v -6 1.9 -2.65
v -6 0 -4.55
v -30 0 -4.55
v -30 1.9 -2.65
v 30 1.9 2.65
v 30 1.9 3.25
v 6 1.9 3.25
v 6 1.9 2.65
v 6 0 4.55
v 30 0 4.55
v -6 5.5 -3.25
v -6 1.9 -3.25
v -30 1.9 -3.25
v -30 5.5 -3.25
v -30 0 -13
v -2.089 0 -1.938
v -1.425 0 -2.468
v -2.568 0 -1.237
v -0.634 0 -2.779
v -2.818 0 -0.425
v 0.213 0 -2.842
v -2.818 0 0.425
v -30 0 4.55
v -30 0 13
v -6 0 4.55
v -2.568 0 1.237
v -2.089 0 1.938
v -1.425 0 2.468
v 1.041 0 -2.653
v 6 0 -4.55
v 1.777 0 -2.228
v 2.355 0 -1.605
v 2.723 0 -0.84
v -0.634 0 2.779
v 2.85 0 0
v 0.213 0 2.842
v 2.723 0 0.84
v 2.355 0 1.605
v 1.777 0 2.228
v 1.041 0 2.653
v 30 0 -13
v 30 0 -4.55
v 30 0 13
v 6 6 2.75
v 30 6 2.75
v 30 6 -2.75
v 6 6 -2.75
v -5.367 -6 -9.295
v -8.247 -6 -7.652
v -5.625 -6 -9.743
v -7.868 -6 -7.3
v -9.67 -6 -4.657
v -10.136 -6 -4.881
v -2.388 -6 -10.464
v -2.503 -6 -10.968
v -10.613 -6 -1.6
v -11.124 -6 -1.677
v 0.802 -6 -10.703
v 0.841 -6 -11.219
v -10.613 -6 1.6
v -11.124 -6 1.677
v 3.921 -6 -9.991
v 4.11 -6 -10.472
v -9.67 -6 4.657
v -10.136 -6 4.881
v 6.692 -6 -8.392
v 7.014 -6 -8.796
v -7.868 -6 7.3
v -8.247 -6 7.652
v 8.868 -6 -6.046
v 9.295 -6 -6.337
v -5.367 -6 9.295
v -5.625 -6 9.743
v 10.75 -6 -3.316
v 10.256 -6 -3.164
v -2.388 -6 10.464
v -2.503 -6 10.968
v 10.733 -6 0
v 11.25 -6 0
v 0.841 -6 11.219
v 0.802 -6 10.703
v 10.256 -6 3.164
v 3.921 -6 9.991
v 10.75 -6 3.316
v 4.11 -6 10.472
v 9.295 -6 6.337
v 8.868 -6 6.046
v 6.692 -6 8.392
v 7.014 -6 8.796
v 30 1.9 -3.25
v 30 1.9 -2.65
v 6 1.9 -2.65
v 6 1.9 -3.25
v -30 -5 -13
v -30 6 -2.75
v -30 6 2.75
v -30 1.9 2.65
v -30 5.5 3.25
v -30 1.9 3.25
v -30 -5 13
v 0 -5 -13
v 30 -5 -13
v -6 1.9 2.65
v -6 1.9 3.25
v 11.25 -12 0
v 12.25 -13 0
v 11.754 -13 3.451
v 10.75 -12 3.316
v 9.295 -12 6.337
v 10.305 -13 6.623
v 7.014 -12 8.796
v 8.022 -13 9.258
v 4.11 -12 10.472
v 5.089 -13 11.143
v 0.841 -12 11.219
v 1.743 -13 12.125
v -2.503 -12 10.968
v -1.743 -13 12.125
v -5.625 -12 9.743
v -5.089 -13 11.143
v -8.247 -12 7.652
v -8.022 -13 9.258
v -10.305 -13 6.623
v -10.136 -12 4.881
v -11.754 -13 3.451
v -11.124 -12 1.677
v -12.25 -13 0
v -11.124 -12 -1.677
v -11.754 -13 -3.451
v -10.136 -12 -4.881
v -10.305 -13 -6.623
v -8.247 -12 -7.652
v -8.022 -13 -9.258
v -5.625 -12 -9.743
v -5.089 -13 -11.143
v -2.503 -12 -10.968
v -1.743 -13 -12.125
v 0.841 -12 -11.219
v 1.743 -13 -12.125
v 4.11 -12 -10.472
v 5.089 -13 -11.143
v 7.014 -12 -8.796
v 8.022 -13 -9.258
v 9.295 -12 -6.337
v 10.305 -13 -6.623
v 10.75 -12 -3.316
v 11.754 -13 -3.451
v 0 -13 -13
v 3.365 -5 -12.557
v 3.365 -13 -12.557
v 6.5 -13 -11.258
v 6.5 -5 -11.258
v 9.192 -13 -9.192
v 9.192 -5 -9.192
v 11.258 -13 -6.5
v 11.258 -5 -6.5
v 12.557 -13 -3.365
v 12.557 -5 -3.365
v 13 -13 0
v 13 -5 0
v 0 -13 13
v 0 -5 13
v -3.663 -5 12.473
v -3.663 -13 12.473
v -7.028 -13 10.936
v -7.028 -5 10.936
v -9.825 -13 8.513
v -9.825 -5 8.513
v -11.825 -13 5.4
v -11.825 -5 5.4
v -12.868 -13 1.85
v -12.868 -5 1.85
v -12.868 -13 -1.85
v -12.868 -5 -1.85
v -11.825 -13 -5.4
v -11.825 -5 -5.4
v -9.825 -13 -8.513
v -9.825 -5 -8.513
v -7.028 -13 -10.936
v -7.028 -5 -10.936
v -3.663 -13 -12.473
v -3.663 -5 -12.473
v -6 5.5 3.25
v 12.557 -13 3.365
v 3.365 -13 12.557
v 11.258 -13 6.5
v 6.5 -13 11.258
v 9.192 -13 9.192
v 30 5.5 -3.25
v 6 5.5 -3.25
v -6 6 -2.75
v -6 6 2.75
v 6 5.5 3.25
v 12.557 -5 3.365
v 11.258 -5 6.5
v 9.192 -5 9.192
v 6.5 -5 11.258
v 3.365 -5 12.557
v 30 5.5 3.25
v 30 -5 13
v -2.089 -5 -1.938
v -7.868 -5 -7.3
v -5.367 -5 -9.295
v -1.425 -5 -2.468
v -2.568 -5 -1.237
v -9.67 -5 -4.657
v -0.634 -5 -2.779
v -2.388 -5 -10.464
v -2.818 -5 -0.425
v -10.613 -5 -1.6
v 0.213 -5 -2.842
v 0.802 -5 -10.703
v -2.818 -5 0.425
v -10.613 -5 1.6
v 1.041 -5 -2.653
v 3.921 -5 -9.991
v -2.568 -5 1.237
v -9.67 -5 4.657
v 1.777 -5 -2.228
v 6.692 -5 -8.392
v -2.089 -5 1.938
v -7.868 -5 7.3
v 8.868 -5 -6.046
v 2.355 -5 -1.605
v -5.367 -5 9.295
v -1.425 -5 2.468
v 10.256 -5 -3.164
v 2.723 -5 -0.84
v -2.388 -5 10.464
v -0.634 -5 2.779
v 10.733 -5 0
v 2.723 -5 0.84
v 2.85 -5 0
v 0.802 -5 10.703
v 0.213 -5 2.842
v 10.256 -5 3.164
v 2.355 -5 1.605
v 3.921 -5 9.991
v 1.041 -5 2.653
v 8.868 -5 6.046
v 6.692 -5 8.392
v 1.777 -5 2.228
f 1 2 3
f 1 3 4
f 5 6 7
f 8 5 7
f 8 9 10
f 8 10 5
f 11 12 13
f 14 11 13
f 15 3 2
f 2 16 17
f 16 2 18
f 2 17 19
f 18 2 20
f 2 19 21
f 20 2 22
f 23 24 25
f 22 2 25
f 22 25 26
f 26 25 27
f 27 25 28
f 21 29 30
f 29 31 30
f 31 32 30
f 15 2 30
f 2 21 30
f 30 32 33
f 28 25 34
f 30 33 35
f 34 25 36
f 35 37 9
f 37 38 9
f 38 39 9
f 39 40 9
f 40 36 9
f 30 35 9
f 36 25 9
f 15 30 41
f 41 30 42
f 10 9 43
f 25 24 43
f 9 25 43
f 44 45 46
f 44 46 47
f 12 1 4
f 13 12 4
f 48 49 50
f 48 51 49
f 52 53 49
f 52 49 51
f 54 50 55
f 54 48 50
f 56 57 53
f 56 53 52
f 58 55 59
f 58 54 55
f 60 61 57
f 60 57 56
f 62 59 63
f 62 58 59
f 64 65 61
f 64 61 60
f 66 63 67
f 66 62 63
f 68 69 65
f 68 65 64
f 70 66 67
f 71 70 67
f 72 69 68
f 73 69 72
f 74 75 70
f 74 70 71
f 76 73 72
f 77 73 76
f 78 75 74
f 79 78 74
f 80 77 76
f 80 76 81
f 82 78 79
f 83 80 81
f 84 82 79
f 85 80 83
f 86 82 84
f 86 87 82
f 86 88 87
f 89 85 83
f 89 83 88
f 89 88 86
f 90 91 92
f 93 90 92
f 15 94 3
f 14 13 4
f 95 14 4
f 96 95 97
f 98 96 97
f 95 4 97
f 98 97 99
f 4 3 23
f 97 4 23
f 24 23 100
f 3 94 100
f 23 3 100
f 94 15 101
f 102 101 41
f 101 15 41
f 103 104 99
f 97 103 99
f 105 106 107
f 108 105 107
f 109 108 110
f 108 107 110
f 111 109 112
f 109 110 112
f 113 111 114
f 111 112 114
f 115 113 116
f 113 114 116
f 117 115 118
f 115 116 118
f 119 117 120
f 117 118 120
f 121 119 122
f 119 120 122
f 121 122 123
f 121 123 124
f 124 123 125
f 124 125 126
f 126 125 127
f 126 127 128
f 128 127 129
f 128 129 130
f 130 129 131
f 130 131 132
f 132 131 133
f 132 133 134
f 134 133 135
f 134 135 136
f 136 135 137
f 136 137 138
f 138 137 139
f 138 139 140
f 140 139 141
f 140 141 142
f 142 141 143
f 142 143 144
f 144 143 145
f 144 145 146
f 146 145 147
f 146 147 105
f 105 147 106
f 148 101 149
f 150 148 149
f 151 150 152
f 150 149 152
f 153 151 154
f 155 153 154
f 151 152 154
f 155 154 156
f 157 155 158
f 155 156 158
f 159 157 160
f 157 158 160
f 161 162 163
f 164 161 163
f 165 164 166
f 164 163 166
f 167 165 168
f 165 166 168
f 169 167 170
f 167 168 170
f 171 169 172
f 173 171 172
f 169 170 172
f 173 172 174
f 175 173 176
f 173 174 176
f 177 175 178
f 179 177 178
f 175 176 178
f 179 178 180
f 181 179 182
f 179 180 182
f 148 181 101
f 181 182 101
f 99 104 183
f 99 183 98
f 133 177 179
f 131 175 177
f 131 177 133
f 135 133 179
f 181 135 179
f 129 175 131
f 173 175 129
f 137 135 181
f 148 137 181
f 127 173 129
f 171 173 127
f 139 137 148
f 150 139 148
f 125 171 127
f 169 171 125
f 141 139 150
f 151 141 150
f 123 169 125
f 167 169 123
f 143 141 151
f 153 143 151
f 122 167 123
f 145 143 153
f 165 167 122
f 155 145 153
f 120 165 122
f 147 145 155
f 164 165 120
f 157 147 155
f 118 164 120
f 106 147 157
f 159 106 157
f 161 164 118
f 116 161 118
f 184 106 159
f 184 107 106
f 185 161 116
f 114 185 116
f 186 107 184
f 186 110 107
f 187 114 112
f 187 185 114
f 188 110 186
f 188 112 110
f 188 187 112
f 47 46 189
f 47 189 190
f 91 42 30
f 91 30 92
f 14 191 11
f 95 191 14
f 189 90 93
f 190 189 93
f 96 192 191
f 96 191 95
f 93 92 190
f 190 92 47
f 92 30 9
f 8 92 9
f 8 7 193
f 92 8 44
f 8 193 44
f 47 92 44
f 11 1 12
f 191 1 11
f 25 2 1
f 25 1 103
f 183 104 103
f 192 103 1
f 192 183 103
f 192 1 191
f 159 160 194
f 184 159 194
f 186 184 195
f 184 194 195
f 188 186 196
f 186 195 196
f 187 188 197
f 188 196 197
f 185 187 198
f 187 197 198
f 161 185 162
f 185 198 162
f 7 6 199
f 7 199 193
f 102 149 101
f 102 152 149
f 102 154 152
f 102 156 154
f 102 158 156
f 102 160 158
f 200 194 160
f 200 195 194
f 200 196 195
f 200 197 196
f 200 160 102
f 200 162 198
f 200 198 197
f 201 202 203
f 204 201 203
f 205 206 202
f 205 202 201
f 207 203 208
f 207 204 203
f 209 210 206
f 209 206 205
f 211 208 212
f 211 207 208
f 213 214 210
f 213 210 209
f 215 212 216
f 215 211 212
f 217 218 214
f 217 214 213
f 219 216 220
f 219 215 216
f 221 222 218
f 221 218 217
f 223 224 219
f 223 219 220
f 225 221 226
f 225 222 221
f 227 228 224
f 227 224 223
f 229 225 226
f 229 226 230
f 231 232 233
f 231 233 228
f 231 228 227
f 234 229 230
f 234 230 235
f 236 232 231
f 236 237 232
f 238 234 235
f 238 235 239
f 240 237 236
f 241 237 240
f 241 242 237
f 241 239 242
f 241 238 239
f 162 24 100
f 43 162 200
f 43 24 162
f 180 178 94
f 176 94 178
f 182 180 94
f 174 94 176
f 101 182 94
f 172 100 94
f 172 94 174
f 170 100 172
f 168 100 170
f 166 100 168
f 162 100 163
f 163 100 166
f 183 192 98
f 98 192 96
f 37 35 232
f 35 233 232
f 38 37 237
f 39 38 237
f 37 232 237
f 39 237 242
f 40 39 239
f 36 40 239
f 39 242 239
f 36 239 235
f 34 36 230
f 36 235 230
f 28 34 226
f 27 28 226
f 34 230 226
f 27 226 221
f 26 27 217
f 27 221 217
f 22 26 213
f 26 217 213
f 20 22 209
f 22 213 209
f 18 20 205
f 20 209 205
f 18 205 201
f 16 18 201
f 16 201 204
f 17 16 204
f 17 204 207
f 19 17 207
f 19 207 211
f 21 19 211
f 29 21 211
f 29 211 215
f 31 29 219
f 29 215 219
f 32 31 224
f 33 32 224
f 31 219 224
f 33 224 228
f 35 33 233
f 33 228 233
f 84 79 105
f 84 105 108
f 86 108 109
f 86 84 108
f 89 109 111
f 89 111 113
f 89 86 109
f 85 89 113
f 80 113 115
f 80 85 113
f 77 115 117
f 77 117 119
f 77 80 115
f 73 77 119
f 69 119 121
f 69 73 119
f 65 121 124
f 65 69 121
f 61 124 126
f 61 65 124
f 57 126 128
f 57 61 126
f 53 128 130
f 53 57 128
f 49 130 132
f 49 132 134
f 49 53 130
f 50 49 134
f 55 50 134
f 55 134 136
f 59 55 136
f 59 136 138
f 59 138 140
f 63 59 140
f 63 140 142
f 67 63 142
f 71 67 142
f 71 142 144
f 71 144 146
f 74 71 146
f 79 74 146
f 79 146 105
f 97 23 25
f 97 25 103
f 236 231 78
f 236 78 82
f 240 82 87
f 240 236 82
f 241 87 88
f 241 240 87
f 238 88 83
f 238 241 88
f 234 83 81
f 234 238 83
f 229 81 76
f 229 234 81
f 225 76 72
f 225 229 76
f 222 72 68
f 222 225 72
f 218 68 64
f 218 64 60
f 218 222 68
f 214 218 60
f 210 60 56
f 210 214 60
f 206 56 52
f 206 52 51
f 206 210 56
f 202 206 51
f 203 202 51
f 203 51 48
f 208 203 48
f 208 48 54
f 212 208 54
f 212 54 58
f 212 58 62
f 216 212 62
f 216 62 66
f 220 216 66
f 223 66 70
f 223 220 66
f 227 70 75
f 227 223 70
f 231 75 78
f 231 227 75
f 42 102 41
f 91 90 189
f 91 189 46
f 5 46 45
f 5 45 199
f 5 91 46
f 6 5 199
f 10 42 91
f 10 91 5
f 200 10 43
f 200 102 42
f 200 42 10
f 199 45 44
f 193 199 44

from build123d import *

# Parameters (mm, degrees)
F0_W        = 60
F0_H        = 26
F1_DEPTH    = 5
F2_R        = 11.25
F3_DEPTH    = 8
F4_R        = 11.25
F4_R_2      = 10.7332604818
F5_DEPTH    = 1
F6_SIZE     = 1
F7_W        = 60
F7_H        = 9.3
F8_DEPTH    = 1.9
F9_T4_DEPTH = 70.2867319519
F9_T9_DEPTH = 70.2867319519
F10_W       = 60
F10_H       = 6.5
F11_DEPTH   = 4.1
F12_SIZE    = 0.5
F13_R       = 2.85
F14_DEPTH   = 12.5
F15_W       = 6
F15_H       = 6
F16_DEPTH   = 12.5


# Not quite as in the source:
# - a fillet or chamfer that OpenCascade refuses, or shapes differently, is made with other operations: its cross-section is extruded or revolved along the edge and cut away or added


with BuildPart() as f1:
    # F0 (on Front) → F1 (new body)
    with BuildSketch(Plane.XZ):
        Rectangle(F0_W, F0_H)
    extrude(amount=F1_DEPTH)

    # F2 (on face) → F3 (join)
    with BuildSketch(Plane.XZ.offset(5)):
        with BuildLine():
            ThreePointArc((2.6e-08, -13), (9.1923881646, -9.1923881462), (13, 0))
            ThreePointArc((13, 0), (9.1923881562, 9.1923881546), (2.2e-09, 13))
            ThreePointArc((2.2e-09, 13), (-13, -1.19e-08), (2.6e-08, -13))
        make_face()
        Circle(F2_R, mode=Mode.SUBTRACT)
    extrude(amount=F3_DEPTH)

    # F4 (on face) → F5 (join)
    with BuildSketch(Plane.XZ.offset(5)):
        Circle(F4_R)
        Circle(F4_R_2, mode=Mode.SUBTRACT)
    extrude(amount=F5_DEPTH)

    # F6
    f6_edges = [f1.edges().sort_by_distance(p)[0] for p in [
        (-11.25, -13, 0),
    ]]
    chamfer(f6_edges, length=F6_SIZE)

    # F7 (on face) → F8 (join)
    with BuildSketch(Plane(origin=(0, 0, 0), x_dir=(-1, 0, 0), z_dir=(0, 1, 0))):
        Rectangle(F7_W, F7_H)
    extrude(amount=F8_DEPTH)

    # F9: chamfer of 2 on 2 edges, made by hand


with BuildPart() as f9_tool2:
    # F9_s3 → F9_t4 (new body)
    with BuildSketch(Plane.YZ.offset(-35.1433659759)):
        Polygon((-0.1, 4.65), (1.9, 2.65), (1.9, 4.65), align=None)
    extrude(amount=F9_T4_DEPTH)

    split(bisect_by=Plane.XZ, keep=Keep.BOTTOM)


with BuildPart() as f1_1:
    add(f1.part)

    # F9_t1: cut F9_tool2
    add(f9_tool2.part, mode=Mode.SUBTRACT)


with BuildPart() as f9_tool7:
    # F9_s8 → F9_t9 (new body)
    with BuildSketch(Plane.YZ.offset(35.1433659759)):
        Polygon((-0.1, -4.65), (1.9, -2.65), (1.9, -4.65), align=None)
    extrude(amount=-F9_T9_DEPTH)

    split(bisect_by=Plane.XZ, keep=Keep.BOTTOM)


with BuildPart() as f1_2:
    add(f1_1.part)

    # F9_t6: cut F9_tool7
    add(f9_tool7.part, mode=Mode.SUBTRACT)

    # F10 (on face) → F11 (join)
    with BuildSketch(Plane(origin=(0, 1.9, 0), x_dir=(-1, 0, 0), z_dir=(0, 1, 0))):
        Rectangle(F10_W, F10_H)
    extrude(amount=F11_DEPTH)

    # F12
    f12_edges = [f1_2.edges().sort_by_distance(p)[0] for p in [
        (0, 6, 3.25),
        (0, 6, -3.25),
    ]]
    chamfer(f12_edges, length=F12_SIZE)

    # F13 (on Front) → F14 (cut, symmetric)
    with BuildSketch(Plane.XZ):
        Circle(F13_R)
    extrude(amount=F14_DEPTH, both=True, mode=Mode.SUBTRACT)

    # F15 (on Top) → F16 (cut, symmetric)
    with BuildSketch(Plane.XY):
        with Locations((3, 3)):
            Rectangle(F15_W, F15_H)
        with Locations((-3, 3)):
            Rectangle(F15_W, F15_H)
    extrude(amount=F16_DEPTH, both=True, mode=Mode.SUBTRACT)


solid = f1_2.part
